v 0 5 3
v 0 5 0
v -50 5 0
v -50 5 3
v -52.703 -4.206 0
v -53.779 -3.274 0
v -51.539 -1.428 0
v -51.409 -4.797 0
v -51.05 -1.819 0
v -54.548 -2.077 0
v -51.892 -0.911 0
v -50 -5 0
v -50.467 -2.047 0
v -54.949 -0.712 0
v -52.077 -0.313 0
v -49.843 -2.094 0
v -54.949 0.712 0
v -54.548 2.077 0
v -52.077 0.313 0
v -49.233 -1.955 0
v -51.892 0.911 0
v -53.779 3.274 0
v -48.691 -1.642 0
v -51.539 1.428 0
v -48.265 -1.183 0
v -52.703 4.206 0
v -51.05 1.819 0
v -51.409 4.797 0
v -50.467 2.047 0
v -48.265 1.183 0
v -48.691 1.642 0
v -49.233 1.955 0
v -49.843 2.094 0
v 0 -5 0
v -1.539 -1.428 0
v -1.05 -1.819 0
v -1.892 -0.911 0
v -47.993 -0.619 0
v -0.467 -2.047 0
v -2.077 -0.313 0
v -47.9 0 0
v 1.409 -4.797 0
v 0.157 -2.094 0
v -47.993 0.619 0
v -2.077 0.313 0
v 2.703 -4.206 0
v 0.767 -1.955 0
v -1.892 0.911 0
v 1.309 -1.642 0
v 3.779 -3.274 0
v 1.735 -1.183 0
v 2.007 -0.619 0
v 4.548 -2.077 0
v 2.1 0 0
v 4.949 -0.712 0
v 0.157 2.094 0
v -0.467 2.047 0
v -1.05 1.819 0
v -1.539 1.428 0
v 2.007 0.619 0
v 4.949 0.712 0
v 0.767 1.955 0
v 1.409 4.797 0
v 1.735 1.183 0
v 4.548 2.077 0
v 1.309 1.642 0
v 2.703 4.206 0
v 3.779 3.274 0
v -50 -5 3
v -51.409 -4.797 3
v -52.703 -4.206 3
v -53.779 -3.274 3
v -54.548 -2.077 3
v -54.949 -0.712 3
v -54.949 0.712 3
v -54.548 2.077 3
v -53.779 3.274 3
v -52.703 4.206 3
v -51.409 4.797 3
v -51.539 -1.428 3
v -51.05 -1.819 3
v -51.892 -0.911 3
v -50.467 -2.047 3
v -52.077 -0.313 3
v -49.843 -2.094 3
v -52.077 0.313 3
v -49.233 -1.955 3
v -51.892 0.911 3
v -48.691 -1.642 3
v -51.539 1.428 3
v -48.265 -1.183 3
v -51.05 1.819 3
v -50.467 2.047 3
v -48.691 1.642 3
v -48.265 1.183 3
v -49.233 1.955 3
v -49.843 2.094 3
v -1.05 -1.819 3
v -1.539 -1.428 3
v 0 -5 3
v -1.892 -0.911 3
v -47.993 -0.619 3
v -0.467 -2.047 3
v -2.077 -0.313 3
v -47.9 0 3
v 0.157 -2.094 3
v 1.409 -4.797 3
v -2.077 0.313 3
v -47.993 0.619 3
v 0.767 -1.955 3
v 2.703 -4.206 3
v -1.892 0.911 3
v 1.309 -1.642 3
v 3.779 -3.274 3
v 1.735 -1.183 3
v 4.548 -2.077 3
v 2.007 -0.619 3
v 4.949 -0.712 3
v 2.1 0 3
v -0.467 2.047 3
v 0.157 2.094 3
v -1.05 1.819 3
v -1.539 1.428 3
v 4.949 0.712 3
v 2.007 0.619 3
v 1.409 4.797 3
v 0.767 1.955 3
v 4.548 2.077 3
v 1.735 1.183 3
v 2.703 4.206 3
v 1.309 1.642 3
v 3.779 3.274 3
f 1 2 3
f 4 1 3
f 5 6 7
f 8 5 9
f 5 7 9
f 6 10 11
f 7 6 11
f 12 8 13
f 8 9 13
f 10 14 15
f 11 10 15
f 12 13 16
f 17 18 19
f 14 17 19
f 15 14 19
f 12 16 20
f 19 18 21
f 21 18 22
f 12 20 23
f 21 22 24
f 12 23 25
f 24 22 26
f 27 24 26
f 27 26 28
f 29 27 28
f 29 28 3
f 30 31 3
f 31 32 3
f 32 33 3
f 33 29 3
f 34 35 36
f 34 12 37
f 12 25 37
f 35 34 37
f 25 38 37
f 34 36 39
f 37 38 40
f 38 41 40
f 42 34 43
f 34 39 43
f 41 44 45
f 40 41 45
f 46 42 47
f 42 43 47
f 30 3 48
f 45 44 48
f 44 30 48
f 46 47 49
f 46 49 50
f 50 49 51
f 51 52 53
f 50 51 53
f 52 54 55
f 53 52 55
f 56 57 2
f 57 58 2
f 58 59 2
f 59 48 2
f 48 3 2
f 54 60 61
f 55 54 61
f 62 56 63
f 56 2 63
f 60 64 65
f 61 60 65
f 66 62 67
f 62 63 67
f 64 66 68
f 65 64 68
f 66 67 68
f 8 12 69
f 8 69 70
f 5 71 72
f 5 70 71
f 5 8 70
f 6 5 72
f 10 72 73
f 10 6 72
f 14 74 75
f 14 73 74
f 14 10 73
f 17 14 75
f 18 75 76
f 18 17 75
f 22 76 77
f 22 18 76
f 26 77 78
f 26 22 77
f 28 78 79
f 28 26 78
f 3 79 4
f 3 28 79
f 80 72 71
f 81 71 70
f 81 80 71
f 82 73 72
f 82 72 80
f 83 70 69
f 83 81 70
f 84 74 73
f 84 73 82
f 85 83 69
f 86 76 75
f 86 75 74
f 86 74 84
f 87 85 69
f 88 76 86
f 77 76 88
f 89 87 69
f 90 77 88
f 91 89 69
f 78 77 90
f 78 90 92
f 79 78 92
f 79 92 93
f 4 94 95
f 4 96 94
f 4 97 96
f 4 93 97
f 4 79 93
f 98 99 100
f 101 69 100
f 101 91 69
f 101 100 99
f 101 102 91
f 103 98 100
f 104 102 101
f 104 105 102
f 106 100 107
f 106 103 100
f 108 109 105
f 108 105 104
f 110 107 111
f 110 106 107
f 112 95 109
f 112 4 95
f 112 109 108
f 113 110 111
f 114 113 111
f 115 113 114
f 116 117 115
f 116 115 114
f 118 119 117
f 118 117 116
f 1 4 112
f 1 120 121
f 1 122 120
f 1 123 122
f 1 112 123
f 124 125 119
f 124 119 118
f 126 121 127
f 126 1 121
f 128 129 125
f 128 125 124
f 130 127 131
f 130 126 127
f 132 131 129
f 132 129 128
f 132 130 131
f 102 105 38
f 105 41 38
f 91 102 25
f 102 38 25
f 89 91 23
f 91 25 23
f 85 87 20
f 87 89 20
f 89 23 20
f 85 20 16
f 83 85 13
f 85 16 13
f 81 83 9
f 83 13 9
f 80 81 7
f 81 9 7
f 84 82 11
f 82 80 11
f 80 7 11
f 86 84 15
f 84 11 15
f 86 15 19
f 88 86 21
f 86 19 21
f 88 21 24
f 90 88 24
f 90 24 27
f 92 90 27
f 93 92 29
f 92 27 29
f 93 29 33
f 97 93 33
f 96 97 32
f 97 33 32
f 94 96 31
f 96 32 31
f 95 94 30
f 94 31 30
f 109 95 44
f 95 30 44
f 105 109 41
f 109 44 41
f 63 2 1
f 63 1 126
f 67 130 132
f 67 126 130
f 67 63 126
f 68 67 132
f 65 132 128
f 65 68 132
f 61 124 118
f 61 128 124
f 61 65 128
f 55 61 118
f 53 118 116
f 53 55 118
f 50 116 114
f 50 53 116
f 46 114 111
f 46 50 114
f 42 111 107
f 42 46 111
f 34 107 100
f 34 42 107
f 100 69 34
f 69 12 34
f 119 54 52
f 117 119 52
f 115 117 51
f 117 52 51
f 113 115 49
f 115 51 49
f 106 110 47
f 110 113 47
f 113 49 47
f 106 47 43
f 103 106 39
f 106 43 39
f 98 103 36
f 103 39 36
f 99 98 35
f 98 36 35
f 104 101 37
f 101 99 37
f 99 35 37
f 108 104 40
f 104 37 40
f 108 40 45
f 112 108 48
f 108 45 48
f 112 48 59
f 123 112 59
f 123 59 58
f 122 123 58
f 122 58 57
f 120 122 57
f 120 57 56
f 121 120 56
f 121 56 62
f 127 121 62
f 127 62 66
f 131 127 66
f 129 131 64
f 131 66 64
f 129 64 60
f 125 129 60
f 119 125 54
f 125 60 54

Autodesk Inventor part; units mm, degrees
ref_plane "YZ Plane" through (0, 0, 0) normal (1, 0, 0) x (0, 1, 0)
ref_plane "XZ Plane" through (0, 0, 0) normal (0, 1, 0) x (-1, 0, 0)
ref_plane "XY Plane" through (0, 0, 0) normal (0, 0, 1) x (1, 0, 0)
sketch "草圖1" plane through (0, 0, 0) normal (0, 0, 1) x (1, 0, 0)
  line L0 (-50, 0) -> (0, 0) construction
  line L1 (-50, -5) -> (0, -5)
  line L2 (0, 5) -> (-50, 5)
  arc A0 (-50, 5) -> (-50, -5) centre (-50, 0) ccw
  arc A1 (0, -5) -> (0, 5) centre (0, 0) ccw
  circle A2 centre (-50, 0) radius 2.1
  circle A3 centre (0, 0) radius 2.1
  dimension "d0" = 50
  dimension "d1" = 10
  dimension "d2" = 4.2
  dimension "d3" = 4.2
extrude "擠出1" add sketch "草圖1" along normal blind 3
